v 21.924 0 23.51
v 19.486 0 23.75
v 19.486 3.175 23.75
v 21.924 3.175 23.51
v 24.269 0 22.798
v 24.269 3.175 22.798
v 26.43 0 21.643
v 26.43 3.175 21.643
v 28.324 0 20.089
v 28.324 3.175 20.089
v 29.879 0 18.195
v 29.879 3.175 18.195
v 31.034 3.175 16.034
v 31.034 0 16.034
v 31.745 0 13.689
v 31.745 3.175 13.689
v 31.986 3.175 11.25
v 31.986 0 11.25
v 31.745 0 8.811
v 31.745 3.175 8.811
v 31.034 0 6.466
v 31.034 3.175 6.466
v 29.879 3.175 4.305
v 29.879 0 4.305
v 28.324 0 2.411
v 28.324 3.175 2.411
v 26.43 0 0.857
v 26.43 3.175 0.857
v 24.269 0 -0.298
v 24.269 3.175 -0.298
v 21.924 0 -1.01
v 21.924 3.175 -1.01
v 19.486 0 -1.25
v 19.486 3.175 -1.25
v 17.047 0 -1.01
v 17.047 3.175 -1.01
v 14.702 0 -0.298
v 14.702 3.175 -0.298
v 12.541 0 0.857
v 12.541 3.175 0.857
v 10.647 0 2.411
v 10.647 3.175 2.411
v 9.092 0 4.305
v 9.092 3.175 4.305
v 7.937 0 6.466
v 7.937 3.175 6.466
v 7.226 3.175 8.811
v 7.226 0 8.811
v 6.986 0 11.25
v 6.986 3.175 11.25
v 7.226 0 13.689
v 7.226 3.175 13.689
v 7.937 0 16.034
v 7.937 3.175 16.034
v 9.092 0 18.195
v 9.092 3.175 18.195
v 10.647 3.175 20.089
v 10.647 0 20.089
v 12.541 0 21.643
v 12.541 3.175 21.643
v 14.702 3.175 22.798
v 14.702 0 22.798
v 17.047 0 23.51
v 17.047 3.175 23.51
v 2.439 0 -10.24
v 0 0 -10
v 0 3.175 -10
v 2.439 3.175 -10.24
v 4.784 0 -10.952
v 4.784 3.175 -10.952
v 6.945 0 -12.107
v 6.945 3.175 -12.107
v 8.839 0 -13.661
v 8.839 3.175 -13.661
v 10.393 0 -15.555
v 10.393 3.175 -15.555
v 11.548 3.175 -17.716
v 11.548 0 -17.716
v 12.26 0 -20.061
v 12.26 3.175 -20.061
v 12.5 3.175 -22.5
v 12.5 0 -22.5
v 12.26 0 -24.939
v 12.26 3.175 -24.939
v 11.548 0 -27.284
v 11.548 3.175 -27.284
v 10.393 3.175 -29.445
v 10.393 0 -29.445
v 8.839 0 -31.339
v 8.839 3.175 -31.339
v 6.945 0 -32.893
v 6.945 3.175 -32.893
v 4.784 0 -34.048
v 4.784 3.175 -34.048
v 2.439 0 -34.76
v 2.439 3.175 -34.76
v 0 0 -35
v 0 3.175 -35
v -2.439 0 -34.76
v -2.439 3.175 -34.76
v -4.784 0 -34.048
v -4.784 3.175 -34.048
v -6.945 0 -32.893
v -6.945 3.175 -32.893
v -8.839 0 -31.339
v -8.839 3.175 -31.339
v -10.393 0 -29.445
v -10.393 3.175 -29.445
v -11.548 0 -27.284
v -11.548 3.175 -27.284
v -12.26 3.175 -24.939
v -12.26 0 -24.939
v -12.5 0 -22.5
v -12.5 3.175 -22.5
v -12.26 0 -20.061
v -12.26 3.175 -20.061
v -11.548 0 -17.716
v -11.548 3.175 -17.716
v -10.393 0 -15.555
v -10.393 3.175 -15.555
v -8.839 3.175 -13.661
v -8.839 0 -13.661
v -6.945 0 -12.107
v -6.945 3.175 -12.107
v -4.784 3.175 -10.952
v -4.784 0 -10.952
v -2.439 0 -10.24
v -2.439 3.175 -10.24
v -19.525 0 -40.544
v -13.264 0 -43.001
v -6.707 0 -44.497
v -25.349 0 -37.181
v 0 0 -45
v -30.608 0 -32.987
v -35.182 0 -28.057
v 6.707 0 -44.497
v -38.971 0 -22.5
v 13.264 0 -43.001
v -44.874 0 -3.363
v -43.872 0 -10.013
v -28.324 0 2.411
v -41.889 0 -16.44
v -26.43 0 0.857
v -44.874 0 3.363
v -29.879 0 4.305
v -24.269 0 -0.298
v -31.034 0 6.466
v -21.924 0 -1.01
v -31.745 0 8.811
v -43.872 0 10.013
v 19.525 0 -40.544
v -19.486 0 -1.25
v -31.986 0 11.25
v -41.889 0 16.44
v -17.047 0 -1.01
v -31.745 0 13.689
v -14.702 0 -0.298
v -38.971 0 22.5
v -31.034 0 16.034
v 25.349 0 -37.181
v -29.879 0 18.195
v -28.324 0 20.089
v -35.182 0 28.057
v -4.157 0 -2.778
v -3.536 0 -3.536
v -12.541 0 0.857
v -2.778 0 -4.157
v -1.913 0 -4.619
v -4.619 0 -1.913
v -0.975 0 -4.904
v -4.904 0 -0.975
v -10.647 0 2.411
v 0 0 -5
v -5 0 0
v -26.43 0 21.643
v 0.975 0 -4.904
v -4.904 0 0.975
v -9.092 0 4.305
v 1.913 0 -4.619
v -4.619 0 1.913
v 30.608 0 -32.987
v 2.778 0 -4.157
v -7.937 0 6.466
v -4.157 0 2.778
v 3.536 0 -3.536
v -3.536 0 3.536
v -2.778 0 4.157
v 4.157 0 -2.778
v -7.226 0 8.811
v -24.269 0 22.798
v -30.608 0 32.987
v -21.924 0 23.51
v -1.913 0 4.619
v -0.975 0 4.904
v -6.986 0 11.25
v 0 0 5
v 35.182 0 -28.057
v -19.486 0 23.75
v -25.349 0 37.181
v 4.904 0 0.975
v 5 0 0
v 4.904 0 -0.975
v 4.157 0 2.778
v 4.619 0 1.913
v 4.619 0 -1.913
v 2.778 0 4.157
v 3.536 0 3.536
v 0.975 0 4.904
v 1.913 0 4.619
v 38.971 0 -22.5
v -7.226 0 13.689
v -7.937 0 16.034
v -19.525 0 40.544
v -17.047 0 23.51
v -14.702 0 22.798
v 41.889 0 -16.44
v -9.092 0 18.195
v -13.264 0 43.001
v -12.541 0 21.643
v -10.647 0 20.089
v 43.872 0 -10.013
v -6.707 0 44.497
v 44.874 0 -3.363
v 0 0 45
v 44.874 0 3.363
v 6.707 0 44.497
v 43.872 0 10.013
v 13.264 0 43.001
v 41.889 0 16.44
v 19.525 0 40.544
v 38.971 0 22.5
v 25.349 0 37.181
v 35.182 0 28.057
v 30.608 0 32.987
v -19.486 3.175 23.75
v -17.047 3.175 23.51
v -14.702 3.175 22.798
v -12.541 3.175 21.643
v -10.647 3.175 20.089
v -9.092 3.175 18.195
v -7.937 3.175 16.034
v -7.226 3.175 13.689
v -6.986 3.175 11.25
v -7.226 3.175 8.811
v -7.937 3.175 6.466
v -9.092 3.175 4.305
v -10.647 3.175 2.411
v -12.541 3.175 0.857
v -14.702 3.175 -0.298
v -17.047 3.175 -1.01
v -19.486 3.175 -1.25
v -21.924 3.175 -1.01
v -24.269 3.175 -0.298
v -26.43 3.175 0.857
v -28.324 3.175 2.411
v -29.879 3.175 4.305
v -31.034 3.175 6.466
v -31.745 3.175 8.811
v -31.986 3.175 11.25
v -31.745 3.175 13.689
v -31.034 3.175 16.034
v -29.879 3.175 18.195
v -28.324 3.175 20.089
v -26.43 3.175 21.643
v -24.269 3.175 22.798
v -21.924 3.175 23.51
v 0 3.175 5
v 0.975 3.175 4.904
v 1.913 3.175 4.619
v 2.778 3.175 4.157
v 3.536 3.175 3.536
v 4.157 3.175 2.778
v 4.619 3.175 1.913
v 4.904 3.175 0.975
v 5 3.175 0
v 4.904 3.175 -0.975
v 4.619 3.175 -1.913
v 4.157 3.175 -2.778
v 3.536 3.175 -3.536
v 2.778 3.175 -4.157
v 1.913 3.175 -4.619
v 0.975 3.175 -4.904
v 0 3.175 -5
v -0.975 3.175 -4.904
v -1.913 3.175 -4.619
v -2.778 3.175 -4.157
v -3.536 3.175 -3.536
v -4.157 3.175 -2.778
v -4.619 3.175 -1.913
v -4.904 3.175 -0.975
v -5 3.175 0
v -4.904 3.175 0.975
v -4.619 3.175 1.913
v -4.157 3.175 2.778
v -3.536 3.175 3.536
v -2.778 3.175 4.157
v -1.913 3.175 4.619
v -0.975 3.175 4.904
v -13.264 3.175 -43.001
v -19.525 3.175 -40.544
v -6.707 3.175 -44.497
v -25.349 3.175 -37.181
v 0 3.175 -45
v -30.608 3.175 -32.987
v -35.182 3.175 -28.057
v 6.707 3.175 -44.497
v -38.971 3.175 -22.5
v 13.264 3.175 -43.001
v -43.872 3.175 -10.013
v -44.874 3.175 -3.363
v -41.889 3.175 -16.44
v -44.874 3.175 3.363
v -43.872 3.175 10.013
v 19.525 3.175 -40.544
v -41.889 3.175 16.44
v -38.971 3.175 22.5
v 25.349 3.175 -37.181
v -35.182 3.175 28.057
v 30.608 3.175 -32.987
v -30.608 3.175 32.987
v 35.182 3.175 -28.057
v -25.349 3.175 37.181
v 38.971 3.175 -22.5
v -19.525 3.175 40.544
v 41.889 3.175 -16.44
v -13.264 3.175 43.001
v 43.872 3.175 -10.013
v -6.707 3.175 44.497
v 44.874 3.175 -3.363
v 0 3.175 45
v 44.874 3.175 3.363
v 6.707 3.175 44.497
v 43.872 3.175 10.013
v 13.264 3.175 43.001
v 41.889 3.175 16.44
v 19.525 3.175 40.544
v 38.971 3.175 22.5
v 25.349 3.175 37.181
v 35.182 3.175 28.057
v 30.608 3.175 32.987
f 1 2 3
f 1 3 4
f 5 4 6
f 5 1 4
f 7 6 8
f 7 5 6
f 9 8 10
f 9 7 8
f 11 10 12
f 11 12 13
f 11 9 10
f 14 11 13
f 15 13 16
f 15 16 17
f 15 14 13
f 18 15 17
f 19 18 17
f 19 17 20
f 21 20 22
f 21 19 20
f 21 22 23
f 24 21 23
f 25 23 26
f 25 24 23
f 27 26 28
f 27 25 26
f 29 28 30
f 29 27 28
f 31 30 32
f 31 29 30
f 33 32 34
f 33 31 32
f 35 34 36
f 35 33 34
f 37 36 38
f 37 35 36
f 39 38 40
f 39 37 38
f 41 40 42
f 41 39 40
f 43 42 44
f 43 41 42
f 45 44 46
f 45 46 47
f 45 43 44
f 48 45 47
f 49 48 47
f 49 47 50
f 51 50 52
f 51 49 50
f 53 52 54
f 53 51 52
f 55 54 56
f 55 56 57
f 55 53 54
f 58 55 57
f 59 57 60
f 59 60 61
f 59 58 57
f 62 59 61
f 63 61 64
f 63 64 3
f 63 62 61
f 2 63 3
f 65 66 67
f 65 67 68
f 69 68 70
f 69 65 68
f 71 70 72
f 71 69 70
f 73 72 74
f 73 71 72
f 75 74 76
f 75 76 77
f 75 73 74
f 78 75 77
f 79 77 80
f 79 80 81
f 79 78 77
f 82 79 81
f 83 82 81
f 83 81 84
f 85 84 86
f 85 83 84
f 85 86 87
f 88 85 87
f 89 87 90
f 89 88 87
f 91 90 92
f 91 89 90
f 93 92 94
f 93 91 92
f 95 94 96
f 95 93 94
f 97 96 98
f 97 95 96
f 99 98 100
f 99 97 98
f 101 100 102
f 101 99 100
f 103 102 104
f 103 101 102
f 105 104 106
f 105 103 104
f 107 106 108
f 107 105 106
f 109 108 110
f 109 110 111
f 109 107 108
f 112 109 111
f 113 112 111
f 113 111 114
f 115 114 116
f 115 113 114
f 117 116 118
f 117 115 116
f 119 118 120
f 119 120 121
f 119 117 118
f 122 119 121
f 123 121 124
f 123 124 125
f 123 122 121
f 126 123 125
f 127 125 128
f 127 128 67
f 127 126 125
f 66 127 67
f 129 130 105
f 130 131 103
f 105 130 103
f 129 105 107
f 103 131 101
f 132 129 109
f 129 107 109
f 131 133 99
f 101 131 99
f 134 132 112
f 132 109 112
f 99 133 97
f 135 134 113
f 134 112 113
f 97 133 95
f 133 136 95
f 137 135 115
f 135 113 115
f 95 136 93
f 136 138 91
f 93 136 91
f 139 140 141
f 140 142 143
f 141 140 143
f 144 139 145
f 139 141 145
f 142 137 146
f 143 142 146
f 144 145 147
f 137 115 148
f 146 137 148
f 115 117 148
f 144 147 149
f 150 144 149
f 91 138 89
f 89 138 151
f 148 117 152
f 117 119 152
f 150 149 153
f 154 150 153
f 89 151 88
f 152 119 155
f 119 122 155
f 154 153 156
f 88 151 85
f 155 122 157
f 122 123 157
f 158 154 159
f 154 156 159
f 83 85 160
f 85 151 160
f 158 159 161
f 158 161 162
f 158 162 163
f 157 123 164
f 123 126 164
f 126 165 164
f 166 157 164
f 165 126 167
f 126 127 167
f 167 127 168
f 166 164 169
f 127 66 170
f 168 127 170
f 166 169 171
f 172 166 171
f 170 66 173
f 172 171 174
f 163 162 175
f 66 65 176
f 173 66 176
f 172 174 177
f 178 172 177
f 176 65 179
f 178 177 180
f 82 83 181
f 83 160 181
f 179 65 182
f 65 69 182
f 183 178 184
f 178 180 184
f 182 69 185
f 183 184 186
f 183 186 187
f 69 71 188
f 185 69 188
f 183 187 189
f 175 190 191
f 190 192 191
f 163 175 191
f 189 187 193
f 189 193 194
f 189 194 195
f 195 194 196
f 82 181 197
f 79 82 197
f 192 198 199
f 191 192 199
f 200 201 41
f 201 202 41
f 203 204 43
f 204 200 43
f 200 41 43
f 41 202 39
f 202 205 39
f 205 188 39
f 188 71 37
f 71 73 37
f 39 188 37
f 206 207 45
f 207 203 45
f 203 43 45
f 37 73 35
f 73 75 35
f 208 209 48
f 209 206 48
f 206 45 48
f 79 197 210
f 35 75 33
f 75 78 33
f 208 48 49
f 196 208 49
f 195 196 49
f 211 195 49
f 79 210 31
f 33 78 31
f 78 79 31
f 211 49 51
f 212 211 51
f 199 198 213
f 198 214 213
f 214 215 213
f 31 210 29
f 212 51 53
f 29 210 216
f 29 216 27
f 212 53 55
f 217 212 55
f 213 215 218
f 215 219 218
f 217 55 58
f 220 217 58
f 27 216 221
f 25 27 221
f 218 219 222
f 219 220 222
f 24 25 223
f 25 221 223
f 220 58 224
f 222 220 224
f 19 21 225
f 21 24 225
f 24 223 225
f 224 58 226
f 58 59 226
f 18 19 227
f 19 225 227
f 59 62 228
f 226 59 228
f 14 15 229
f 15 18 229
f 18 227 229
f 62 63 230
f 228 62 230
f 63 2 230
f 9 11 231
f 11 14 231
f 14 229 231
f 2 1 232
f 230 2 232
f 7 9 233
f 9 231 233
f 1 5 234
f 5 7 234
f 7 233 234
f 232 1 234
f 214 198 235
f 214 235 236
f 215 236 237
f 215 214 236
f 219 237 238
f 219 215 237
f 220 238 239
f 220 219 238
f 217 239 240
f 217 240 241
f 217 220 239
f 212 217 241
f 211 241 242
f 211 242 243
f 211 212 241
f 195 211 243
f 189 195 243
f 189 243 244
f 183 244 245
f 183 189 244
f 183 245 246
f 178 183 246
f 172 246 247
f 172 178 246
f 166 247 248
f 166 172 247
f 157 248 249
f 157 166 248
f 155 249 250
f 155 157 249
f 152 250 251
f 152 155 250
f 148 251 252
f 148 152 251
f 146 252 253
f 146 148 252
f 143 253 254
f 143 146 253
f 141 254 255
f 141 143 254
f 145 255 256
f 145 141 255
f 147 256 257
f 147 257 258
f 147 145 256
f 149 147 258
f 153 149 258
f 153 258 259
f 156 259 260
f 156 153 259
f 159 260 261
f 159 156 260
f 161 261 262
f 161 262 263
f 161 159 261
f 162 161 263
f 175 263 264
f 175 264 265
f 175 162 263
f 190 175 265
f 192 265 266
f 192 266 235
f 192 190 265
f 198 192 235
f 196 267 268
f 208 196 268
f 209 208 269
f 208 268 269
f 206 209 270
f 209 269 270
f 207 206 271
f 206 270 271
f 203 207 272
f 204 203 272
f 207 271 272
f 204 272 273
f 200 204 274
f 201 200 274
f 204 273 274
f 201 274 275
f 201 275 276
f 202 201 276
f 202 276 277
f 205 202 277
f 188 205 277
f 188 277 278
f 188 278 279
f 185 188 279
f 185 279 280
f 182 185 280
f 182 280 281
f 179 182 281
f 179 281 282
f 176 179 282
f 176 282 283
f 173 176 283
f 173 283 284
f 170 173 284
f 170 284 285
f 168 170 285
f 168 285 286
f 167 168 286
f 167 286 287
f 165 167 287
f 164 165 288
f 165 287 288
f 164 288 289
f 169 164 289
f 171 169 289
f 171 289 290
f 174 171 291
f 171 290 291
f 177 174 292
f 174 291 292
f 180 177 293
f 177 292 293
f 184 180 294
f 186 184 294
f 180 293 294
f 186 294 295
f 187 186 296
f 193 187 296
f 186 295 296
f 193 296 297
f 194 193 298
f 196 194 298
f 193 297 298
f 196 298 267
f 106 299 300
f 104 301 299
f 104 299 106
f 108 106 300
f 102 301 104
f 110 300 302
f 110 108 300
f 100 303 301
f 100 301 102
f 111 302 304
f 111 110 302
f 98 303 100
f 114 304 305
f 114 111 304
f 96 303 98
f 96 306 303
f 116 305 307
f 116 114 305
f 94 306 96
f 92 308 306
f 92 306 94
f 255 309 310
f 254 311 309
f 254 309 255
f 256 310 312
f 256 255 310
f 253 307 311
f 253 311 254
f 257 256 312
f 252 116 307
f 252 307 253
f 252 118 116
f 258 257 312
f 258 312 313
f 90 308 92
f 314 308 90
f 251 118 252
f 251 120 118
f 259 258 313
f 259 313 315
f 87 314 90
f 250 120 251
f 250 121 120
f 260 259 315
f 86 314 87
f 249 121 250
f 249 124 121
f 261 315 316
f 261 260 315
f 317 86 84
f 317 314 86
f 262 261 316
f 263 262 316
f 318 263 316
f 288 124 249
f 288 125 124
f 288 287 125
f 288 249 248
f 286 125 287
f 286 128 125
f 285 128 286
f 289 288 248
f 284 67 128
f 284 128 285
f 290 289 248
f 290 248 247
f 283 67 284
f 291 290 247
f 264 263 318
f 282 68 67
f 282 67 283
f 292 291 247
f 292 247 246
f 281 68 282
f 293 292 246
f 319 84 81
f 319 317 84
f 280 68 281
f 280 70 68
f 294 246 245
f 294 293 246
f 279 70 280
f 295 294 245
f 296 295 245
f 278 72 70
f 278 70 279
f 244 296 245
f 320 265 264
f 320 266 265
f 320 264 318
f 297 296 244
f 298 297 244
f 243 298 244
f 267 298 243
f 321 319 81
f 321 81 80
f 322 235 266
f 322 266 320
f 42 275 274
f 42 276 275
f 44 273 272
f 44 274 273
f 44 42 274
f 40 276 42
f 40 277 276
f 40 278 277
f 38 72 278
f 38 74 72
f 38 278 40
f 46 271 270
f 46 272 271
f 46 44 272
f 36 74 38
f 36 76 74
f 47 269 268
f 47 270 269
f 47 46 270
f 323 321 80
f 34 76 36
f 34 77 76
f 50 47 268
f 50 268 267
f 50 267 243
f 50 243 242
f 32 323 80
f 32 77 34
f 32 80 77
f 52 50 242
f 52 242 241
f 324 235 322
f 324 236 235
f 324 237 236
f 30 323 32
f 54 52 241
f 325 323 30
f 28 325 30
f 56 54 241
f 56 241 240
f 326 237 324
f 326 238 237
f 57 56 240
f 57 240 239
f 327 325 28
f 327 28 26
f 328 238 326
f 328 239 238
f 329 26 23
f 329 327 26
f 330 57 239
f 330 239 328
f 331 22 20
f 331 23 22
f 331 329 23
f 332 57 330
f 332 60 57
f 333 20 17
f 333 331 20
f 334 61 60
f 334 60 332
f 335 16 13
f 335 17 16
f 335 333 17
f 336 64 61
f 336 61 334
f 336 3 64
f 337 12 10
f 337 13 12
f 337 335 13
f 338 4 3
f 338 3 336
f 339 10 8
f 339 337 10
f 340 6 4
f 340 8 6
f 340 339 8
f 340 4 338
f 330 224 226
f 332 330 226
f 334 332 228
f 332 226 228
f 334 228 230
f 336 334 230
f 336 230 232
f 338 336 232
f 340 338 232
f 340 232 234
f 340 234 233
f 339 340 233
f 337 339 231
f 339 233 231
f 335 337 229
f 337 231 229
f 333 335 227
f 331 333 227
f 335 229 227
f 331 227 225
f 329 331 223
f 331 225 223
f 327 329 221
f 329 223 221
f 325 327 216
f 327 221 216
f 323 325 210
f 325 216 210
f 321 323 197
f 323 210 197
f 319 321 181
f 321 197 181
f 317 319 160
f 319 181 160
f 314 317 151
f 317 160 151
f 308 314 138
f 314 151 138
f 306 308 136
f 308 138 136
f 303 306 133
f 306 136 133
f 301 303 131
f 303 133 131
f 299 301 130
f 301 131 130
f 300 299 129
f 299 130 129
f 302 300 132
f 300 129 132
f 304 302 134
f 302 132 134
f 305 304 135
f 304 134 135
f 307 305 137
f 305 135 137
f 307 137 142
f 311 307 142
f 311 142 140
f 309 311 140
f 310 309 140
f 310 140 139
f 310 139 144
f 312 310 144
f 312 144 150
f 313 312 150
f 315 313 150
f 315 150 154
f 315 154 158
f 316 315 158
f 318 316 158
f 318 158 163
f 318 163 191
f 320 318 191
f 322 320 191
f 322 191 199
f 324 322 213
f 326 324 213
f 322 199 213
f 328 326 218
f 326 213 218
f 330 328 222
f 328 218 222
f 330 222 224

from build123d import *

# Parameters (mm, degrees)
SKETCH1_R           = 45
SKETCH1_R_2         = 12.5
BOSS_EXTRUDE1_DEPTH = 3.175
SKETCH3_R           = 5
CUT_EXTRUDE1_DEPTH  = 6.35


with BuildPart() as part:
    # Sketch1 → Boss-Extrude1 (new body)
    with BuildSketch(Plane(origin=(0, 0, 0), x_dir=(1, 0, 0), z_dir=(0, 1, 0))):
        with Locations(Location((0, 0, 0), (0, 0, 270))):
            Circle(SKETCH1_R)
        with Locations(Location((0, 22.5, 0), (0, 0, 270))):
            Circle(SKETCH1_R_2, mode=Mode.SUBTRACT)
        with Locations(Location((19.485571585, -11.25, 0), (0, 0, 270))):
            Circle(SKETCH1_R_2, mode=Mode.SUBTRACT)
        with Locations(Location((-19.485571585, -11.25, 0), (0, 0, 270))):
            Circle(SKETCH1_R_2, mode=Mode.SUBTRACT)
    extrude(amount=BOSS_EXTRUDE1_DEPTH)

    # Sketch3 → Cut-Extrude1 (cut)
    with BuildSketch(Plane(origin=(0, 3.175, 0), x_dir=(1, 0, 0), z_dir=(0, 1, 0))):
        with Locations(Location((0, 0, 0), (0, 0, 270))):
            Circle(SKETCH3_R)
    extrude(amount=-CUT_EXTRUDE1_DEPTH, mode=Mode.SUBTRACT)


solid = part.part
